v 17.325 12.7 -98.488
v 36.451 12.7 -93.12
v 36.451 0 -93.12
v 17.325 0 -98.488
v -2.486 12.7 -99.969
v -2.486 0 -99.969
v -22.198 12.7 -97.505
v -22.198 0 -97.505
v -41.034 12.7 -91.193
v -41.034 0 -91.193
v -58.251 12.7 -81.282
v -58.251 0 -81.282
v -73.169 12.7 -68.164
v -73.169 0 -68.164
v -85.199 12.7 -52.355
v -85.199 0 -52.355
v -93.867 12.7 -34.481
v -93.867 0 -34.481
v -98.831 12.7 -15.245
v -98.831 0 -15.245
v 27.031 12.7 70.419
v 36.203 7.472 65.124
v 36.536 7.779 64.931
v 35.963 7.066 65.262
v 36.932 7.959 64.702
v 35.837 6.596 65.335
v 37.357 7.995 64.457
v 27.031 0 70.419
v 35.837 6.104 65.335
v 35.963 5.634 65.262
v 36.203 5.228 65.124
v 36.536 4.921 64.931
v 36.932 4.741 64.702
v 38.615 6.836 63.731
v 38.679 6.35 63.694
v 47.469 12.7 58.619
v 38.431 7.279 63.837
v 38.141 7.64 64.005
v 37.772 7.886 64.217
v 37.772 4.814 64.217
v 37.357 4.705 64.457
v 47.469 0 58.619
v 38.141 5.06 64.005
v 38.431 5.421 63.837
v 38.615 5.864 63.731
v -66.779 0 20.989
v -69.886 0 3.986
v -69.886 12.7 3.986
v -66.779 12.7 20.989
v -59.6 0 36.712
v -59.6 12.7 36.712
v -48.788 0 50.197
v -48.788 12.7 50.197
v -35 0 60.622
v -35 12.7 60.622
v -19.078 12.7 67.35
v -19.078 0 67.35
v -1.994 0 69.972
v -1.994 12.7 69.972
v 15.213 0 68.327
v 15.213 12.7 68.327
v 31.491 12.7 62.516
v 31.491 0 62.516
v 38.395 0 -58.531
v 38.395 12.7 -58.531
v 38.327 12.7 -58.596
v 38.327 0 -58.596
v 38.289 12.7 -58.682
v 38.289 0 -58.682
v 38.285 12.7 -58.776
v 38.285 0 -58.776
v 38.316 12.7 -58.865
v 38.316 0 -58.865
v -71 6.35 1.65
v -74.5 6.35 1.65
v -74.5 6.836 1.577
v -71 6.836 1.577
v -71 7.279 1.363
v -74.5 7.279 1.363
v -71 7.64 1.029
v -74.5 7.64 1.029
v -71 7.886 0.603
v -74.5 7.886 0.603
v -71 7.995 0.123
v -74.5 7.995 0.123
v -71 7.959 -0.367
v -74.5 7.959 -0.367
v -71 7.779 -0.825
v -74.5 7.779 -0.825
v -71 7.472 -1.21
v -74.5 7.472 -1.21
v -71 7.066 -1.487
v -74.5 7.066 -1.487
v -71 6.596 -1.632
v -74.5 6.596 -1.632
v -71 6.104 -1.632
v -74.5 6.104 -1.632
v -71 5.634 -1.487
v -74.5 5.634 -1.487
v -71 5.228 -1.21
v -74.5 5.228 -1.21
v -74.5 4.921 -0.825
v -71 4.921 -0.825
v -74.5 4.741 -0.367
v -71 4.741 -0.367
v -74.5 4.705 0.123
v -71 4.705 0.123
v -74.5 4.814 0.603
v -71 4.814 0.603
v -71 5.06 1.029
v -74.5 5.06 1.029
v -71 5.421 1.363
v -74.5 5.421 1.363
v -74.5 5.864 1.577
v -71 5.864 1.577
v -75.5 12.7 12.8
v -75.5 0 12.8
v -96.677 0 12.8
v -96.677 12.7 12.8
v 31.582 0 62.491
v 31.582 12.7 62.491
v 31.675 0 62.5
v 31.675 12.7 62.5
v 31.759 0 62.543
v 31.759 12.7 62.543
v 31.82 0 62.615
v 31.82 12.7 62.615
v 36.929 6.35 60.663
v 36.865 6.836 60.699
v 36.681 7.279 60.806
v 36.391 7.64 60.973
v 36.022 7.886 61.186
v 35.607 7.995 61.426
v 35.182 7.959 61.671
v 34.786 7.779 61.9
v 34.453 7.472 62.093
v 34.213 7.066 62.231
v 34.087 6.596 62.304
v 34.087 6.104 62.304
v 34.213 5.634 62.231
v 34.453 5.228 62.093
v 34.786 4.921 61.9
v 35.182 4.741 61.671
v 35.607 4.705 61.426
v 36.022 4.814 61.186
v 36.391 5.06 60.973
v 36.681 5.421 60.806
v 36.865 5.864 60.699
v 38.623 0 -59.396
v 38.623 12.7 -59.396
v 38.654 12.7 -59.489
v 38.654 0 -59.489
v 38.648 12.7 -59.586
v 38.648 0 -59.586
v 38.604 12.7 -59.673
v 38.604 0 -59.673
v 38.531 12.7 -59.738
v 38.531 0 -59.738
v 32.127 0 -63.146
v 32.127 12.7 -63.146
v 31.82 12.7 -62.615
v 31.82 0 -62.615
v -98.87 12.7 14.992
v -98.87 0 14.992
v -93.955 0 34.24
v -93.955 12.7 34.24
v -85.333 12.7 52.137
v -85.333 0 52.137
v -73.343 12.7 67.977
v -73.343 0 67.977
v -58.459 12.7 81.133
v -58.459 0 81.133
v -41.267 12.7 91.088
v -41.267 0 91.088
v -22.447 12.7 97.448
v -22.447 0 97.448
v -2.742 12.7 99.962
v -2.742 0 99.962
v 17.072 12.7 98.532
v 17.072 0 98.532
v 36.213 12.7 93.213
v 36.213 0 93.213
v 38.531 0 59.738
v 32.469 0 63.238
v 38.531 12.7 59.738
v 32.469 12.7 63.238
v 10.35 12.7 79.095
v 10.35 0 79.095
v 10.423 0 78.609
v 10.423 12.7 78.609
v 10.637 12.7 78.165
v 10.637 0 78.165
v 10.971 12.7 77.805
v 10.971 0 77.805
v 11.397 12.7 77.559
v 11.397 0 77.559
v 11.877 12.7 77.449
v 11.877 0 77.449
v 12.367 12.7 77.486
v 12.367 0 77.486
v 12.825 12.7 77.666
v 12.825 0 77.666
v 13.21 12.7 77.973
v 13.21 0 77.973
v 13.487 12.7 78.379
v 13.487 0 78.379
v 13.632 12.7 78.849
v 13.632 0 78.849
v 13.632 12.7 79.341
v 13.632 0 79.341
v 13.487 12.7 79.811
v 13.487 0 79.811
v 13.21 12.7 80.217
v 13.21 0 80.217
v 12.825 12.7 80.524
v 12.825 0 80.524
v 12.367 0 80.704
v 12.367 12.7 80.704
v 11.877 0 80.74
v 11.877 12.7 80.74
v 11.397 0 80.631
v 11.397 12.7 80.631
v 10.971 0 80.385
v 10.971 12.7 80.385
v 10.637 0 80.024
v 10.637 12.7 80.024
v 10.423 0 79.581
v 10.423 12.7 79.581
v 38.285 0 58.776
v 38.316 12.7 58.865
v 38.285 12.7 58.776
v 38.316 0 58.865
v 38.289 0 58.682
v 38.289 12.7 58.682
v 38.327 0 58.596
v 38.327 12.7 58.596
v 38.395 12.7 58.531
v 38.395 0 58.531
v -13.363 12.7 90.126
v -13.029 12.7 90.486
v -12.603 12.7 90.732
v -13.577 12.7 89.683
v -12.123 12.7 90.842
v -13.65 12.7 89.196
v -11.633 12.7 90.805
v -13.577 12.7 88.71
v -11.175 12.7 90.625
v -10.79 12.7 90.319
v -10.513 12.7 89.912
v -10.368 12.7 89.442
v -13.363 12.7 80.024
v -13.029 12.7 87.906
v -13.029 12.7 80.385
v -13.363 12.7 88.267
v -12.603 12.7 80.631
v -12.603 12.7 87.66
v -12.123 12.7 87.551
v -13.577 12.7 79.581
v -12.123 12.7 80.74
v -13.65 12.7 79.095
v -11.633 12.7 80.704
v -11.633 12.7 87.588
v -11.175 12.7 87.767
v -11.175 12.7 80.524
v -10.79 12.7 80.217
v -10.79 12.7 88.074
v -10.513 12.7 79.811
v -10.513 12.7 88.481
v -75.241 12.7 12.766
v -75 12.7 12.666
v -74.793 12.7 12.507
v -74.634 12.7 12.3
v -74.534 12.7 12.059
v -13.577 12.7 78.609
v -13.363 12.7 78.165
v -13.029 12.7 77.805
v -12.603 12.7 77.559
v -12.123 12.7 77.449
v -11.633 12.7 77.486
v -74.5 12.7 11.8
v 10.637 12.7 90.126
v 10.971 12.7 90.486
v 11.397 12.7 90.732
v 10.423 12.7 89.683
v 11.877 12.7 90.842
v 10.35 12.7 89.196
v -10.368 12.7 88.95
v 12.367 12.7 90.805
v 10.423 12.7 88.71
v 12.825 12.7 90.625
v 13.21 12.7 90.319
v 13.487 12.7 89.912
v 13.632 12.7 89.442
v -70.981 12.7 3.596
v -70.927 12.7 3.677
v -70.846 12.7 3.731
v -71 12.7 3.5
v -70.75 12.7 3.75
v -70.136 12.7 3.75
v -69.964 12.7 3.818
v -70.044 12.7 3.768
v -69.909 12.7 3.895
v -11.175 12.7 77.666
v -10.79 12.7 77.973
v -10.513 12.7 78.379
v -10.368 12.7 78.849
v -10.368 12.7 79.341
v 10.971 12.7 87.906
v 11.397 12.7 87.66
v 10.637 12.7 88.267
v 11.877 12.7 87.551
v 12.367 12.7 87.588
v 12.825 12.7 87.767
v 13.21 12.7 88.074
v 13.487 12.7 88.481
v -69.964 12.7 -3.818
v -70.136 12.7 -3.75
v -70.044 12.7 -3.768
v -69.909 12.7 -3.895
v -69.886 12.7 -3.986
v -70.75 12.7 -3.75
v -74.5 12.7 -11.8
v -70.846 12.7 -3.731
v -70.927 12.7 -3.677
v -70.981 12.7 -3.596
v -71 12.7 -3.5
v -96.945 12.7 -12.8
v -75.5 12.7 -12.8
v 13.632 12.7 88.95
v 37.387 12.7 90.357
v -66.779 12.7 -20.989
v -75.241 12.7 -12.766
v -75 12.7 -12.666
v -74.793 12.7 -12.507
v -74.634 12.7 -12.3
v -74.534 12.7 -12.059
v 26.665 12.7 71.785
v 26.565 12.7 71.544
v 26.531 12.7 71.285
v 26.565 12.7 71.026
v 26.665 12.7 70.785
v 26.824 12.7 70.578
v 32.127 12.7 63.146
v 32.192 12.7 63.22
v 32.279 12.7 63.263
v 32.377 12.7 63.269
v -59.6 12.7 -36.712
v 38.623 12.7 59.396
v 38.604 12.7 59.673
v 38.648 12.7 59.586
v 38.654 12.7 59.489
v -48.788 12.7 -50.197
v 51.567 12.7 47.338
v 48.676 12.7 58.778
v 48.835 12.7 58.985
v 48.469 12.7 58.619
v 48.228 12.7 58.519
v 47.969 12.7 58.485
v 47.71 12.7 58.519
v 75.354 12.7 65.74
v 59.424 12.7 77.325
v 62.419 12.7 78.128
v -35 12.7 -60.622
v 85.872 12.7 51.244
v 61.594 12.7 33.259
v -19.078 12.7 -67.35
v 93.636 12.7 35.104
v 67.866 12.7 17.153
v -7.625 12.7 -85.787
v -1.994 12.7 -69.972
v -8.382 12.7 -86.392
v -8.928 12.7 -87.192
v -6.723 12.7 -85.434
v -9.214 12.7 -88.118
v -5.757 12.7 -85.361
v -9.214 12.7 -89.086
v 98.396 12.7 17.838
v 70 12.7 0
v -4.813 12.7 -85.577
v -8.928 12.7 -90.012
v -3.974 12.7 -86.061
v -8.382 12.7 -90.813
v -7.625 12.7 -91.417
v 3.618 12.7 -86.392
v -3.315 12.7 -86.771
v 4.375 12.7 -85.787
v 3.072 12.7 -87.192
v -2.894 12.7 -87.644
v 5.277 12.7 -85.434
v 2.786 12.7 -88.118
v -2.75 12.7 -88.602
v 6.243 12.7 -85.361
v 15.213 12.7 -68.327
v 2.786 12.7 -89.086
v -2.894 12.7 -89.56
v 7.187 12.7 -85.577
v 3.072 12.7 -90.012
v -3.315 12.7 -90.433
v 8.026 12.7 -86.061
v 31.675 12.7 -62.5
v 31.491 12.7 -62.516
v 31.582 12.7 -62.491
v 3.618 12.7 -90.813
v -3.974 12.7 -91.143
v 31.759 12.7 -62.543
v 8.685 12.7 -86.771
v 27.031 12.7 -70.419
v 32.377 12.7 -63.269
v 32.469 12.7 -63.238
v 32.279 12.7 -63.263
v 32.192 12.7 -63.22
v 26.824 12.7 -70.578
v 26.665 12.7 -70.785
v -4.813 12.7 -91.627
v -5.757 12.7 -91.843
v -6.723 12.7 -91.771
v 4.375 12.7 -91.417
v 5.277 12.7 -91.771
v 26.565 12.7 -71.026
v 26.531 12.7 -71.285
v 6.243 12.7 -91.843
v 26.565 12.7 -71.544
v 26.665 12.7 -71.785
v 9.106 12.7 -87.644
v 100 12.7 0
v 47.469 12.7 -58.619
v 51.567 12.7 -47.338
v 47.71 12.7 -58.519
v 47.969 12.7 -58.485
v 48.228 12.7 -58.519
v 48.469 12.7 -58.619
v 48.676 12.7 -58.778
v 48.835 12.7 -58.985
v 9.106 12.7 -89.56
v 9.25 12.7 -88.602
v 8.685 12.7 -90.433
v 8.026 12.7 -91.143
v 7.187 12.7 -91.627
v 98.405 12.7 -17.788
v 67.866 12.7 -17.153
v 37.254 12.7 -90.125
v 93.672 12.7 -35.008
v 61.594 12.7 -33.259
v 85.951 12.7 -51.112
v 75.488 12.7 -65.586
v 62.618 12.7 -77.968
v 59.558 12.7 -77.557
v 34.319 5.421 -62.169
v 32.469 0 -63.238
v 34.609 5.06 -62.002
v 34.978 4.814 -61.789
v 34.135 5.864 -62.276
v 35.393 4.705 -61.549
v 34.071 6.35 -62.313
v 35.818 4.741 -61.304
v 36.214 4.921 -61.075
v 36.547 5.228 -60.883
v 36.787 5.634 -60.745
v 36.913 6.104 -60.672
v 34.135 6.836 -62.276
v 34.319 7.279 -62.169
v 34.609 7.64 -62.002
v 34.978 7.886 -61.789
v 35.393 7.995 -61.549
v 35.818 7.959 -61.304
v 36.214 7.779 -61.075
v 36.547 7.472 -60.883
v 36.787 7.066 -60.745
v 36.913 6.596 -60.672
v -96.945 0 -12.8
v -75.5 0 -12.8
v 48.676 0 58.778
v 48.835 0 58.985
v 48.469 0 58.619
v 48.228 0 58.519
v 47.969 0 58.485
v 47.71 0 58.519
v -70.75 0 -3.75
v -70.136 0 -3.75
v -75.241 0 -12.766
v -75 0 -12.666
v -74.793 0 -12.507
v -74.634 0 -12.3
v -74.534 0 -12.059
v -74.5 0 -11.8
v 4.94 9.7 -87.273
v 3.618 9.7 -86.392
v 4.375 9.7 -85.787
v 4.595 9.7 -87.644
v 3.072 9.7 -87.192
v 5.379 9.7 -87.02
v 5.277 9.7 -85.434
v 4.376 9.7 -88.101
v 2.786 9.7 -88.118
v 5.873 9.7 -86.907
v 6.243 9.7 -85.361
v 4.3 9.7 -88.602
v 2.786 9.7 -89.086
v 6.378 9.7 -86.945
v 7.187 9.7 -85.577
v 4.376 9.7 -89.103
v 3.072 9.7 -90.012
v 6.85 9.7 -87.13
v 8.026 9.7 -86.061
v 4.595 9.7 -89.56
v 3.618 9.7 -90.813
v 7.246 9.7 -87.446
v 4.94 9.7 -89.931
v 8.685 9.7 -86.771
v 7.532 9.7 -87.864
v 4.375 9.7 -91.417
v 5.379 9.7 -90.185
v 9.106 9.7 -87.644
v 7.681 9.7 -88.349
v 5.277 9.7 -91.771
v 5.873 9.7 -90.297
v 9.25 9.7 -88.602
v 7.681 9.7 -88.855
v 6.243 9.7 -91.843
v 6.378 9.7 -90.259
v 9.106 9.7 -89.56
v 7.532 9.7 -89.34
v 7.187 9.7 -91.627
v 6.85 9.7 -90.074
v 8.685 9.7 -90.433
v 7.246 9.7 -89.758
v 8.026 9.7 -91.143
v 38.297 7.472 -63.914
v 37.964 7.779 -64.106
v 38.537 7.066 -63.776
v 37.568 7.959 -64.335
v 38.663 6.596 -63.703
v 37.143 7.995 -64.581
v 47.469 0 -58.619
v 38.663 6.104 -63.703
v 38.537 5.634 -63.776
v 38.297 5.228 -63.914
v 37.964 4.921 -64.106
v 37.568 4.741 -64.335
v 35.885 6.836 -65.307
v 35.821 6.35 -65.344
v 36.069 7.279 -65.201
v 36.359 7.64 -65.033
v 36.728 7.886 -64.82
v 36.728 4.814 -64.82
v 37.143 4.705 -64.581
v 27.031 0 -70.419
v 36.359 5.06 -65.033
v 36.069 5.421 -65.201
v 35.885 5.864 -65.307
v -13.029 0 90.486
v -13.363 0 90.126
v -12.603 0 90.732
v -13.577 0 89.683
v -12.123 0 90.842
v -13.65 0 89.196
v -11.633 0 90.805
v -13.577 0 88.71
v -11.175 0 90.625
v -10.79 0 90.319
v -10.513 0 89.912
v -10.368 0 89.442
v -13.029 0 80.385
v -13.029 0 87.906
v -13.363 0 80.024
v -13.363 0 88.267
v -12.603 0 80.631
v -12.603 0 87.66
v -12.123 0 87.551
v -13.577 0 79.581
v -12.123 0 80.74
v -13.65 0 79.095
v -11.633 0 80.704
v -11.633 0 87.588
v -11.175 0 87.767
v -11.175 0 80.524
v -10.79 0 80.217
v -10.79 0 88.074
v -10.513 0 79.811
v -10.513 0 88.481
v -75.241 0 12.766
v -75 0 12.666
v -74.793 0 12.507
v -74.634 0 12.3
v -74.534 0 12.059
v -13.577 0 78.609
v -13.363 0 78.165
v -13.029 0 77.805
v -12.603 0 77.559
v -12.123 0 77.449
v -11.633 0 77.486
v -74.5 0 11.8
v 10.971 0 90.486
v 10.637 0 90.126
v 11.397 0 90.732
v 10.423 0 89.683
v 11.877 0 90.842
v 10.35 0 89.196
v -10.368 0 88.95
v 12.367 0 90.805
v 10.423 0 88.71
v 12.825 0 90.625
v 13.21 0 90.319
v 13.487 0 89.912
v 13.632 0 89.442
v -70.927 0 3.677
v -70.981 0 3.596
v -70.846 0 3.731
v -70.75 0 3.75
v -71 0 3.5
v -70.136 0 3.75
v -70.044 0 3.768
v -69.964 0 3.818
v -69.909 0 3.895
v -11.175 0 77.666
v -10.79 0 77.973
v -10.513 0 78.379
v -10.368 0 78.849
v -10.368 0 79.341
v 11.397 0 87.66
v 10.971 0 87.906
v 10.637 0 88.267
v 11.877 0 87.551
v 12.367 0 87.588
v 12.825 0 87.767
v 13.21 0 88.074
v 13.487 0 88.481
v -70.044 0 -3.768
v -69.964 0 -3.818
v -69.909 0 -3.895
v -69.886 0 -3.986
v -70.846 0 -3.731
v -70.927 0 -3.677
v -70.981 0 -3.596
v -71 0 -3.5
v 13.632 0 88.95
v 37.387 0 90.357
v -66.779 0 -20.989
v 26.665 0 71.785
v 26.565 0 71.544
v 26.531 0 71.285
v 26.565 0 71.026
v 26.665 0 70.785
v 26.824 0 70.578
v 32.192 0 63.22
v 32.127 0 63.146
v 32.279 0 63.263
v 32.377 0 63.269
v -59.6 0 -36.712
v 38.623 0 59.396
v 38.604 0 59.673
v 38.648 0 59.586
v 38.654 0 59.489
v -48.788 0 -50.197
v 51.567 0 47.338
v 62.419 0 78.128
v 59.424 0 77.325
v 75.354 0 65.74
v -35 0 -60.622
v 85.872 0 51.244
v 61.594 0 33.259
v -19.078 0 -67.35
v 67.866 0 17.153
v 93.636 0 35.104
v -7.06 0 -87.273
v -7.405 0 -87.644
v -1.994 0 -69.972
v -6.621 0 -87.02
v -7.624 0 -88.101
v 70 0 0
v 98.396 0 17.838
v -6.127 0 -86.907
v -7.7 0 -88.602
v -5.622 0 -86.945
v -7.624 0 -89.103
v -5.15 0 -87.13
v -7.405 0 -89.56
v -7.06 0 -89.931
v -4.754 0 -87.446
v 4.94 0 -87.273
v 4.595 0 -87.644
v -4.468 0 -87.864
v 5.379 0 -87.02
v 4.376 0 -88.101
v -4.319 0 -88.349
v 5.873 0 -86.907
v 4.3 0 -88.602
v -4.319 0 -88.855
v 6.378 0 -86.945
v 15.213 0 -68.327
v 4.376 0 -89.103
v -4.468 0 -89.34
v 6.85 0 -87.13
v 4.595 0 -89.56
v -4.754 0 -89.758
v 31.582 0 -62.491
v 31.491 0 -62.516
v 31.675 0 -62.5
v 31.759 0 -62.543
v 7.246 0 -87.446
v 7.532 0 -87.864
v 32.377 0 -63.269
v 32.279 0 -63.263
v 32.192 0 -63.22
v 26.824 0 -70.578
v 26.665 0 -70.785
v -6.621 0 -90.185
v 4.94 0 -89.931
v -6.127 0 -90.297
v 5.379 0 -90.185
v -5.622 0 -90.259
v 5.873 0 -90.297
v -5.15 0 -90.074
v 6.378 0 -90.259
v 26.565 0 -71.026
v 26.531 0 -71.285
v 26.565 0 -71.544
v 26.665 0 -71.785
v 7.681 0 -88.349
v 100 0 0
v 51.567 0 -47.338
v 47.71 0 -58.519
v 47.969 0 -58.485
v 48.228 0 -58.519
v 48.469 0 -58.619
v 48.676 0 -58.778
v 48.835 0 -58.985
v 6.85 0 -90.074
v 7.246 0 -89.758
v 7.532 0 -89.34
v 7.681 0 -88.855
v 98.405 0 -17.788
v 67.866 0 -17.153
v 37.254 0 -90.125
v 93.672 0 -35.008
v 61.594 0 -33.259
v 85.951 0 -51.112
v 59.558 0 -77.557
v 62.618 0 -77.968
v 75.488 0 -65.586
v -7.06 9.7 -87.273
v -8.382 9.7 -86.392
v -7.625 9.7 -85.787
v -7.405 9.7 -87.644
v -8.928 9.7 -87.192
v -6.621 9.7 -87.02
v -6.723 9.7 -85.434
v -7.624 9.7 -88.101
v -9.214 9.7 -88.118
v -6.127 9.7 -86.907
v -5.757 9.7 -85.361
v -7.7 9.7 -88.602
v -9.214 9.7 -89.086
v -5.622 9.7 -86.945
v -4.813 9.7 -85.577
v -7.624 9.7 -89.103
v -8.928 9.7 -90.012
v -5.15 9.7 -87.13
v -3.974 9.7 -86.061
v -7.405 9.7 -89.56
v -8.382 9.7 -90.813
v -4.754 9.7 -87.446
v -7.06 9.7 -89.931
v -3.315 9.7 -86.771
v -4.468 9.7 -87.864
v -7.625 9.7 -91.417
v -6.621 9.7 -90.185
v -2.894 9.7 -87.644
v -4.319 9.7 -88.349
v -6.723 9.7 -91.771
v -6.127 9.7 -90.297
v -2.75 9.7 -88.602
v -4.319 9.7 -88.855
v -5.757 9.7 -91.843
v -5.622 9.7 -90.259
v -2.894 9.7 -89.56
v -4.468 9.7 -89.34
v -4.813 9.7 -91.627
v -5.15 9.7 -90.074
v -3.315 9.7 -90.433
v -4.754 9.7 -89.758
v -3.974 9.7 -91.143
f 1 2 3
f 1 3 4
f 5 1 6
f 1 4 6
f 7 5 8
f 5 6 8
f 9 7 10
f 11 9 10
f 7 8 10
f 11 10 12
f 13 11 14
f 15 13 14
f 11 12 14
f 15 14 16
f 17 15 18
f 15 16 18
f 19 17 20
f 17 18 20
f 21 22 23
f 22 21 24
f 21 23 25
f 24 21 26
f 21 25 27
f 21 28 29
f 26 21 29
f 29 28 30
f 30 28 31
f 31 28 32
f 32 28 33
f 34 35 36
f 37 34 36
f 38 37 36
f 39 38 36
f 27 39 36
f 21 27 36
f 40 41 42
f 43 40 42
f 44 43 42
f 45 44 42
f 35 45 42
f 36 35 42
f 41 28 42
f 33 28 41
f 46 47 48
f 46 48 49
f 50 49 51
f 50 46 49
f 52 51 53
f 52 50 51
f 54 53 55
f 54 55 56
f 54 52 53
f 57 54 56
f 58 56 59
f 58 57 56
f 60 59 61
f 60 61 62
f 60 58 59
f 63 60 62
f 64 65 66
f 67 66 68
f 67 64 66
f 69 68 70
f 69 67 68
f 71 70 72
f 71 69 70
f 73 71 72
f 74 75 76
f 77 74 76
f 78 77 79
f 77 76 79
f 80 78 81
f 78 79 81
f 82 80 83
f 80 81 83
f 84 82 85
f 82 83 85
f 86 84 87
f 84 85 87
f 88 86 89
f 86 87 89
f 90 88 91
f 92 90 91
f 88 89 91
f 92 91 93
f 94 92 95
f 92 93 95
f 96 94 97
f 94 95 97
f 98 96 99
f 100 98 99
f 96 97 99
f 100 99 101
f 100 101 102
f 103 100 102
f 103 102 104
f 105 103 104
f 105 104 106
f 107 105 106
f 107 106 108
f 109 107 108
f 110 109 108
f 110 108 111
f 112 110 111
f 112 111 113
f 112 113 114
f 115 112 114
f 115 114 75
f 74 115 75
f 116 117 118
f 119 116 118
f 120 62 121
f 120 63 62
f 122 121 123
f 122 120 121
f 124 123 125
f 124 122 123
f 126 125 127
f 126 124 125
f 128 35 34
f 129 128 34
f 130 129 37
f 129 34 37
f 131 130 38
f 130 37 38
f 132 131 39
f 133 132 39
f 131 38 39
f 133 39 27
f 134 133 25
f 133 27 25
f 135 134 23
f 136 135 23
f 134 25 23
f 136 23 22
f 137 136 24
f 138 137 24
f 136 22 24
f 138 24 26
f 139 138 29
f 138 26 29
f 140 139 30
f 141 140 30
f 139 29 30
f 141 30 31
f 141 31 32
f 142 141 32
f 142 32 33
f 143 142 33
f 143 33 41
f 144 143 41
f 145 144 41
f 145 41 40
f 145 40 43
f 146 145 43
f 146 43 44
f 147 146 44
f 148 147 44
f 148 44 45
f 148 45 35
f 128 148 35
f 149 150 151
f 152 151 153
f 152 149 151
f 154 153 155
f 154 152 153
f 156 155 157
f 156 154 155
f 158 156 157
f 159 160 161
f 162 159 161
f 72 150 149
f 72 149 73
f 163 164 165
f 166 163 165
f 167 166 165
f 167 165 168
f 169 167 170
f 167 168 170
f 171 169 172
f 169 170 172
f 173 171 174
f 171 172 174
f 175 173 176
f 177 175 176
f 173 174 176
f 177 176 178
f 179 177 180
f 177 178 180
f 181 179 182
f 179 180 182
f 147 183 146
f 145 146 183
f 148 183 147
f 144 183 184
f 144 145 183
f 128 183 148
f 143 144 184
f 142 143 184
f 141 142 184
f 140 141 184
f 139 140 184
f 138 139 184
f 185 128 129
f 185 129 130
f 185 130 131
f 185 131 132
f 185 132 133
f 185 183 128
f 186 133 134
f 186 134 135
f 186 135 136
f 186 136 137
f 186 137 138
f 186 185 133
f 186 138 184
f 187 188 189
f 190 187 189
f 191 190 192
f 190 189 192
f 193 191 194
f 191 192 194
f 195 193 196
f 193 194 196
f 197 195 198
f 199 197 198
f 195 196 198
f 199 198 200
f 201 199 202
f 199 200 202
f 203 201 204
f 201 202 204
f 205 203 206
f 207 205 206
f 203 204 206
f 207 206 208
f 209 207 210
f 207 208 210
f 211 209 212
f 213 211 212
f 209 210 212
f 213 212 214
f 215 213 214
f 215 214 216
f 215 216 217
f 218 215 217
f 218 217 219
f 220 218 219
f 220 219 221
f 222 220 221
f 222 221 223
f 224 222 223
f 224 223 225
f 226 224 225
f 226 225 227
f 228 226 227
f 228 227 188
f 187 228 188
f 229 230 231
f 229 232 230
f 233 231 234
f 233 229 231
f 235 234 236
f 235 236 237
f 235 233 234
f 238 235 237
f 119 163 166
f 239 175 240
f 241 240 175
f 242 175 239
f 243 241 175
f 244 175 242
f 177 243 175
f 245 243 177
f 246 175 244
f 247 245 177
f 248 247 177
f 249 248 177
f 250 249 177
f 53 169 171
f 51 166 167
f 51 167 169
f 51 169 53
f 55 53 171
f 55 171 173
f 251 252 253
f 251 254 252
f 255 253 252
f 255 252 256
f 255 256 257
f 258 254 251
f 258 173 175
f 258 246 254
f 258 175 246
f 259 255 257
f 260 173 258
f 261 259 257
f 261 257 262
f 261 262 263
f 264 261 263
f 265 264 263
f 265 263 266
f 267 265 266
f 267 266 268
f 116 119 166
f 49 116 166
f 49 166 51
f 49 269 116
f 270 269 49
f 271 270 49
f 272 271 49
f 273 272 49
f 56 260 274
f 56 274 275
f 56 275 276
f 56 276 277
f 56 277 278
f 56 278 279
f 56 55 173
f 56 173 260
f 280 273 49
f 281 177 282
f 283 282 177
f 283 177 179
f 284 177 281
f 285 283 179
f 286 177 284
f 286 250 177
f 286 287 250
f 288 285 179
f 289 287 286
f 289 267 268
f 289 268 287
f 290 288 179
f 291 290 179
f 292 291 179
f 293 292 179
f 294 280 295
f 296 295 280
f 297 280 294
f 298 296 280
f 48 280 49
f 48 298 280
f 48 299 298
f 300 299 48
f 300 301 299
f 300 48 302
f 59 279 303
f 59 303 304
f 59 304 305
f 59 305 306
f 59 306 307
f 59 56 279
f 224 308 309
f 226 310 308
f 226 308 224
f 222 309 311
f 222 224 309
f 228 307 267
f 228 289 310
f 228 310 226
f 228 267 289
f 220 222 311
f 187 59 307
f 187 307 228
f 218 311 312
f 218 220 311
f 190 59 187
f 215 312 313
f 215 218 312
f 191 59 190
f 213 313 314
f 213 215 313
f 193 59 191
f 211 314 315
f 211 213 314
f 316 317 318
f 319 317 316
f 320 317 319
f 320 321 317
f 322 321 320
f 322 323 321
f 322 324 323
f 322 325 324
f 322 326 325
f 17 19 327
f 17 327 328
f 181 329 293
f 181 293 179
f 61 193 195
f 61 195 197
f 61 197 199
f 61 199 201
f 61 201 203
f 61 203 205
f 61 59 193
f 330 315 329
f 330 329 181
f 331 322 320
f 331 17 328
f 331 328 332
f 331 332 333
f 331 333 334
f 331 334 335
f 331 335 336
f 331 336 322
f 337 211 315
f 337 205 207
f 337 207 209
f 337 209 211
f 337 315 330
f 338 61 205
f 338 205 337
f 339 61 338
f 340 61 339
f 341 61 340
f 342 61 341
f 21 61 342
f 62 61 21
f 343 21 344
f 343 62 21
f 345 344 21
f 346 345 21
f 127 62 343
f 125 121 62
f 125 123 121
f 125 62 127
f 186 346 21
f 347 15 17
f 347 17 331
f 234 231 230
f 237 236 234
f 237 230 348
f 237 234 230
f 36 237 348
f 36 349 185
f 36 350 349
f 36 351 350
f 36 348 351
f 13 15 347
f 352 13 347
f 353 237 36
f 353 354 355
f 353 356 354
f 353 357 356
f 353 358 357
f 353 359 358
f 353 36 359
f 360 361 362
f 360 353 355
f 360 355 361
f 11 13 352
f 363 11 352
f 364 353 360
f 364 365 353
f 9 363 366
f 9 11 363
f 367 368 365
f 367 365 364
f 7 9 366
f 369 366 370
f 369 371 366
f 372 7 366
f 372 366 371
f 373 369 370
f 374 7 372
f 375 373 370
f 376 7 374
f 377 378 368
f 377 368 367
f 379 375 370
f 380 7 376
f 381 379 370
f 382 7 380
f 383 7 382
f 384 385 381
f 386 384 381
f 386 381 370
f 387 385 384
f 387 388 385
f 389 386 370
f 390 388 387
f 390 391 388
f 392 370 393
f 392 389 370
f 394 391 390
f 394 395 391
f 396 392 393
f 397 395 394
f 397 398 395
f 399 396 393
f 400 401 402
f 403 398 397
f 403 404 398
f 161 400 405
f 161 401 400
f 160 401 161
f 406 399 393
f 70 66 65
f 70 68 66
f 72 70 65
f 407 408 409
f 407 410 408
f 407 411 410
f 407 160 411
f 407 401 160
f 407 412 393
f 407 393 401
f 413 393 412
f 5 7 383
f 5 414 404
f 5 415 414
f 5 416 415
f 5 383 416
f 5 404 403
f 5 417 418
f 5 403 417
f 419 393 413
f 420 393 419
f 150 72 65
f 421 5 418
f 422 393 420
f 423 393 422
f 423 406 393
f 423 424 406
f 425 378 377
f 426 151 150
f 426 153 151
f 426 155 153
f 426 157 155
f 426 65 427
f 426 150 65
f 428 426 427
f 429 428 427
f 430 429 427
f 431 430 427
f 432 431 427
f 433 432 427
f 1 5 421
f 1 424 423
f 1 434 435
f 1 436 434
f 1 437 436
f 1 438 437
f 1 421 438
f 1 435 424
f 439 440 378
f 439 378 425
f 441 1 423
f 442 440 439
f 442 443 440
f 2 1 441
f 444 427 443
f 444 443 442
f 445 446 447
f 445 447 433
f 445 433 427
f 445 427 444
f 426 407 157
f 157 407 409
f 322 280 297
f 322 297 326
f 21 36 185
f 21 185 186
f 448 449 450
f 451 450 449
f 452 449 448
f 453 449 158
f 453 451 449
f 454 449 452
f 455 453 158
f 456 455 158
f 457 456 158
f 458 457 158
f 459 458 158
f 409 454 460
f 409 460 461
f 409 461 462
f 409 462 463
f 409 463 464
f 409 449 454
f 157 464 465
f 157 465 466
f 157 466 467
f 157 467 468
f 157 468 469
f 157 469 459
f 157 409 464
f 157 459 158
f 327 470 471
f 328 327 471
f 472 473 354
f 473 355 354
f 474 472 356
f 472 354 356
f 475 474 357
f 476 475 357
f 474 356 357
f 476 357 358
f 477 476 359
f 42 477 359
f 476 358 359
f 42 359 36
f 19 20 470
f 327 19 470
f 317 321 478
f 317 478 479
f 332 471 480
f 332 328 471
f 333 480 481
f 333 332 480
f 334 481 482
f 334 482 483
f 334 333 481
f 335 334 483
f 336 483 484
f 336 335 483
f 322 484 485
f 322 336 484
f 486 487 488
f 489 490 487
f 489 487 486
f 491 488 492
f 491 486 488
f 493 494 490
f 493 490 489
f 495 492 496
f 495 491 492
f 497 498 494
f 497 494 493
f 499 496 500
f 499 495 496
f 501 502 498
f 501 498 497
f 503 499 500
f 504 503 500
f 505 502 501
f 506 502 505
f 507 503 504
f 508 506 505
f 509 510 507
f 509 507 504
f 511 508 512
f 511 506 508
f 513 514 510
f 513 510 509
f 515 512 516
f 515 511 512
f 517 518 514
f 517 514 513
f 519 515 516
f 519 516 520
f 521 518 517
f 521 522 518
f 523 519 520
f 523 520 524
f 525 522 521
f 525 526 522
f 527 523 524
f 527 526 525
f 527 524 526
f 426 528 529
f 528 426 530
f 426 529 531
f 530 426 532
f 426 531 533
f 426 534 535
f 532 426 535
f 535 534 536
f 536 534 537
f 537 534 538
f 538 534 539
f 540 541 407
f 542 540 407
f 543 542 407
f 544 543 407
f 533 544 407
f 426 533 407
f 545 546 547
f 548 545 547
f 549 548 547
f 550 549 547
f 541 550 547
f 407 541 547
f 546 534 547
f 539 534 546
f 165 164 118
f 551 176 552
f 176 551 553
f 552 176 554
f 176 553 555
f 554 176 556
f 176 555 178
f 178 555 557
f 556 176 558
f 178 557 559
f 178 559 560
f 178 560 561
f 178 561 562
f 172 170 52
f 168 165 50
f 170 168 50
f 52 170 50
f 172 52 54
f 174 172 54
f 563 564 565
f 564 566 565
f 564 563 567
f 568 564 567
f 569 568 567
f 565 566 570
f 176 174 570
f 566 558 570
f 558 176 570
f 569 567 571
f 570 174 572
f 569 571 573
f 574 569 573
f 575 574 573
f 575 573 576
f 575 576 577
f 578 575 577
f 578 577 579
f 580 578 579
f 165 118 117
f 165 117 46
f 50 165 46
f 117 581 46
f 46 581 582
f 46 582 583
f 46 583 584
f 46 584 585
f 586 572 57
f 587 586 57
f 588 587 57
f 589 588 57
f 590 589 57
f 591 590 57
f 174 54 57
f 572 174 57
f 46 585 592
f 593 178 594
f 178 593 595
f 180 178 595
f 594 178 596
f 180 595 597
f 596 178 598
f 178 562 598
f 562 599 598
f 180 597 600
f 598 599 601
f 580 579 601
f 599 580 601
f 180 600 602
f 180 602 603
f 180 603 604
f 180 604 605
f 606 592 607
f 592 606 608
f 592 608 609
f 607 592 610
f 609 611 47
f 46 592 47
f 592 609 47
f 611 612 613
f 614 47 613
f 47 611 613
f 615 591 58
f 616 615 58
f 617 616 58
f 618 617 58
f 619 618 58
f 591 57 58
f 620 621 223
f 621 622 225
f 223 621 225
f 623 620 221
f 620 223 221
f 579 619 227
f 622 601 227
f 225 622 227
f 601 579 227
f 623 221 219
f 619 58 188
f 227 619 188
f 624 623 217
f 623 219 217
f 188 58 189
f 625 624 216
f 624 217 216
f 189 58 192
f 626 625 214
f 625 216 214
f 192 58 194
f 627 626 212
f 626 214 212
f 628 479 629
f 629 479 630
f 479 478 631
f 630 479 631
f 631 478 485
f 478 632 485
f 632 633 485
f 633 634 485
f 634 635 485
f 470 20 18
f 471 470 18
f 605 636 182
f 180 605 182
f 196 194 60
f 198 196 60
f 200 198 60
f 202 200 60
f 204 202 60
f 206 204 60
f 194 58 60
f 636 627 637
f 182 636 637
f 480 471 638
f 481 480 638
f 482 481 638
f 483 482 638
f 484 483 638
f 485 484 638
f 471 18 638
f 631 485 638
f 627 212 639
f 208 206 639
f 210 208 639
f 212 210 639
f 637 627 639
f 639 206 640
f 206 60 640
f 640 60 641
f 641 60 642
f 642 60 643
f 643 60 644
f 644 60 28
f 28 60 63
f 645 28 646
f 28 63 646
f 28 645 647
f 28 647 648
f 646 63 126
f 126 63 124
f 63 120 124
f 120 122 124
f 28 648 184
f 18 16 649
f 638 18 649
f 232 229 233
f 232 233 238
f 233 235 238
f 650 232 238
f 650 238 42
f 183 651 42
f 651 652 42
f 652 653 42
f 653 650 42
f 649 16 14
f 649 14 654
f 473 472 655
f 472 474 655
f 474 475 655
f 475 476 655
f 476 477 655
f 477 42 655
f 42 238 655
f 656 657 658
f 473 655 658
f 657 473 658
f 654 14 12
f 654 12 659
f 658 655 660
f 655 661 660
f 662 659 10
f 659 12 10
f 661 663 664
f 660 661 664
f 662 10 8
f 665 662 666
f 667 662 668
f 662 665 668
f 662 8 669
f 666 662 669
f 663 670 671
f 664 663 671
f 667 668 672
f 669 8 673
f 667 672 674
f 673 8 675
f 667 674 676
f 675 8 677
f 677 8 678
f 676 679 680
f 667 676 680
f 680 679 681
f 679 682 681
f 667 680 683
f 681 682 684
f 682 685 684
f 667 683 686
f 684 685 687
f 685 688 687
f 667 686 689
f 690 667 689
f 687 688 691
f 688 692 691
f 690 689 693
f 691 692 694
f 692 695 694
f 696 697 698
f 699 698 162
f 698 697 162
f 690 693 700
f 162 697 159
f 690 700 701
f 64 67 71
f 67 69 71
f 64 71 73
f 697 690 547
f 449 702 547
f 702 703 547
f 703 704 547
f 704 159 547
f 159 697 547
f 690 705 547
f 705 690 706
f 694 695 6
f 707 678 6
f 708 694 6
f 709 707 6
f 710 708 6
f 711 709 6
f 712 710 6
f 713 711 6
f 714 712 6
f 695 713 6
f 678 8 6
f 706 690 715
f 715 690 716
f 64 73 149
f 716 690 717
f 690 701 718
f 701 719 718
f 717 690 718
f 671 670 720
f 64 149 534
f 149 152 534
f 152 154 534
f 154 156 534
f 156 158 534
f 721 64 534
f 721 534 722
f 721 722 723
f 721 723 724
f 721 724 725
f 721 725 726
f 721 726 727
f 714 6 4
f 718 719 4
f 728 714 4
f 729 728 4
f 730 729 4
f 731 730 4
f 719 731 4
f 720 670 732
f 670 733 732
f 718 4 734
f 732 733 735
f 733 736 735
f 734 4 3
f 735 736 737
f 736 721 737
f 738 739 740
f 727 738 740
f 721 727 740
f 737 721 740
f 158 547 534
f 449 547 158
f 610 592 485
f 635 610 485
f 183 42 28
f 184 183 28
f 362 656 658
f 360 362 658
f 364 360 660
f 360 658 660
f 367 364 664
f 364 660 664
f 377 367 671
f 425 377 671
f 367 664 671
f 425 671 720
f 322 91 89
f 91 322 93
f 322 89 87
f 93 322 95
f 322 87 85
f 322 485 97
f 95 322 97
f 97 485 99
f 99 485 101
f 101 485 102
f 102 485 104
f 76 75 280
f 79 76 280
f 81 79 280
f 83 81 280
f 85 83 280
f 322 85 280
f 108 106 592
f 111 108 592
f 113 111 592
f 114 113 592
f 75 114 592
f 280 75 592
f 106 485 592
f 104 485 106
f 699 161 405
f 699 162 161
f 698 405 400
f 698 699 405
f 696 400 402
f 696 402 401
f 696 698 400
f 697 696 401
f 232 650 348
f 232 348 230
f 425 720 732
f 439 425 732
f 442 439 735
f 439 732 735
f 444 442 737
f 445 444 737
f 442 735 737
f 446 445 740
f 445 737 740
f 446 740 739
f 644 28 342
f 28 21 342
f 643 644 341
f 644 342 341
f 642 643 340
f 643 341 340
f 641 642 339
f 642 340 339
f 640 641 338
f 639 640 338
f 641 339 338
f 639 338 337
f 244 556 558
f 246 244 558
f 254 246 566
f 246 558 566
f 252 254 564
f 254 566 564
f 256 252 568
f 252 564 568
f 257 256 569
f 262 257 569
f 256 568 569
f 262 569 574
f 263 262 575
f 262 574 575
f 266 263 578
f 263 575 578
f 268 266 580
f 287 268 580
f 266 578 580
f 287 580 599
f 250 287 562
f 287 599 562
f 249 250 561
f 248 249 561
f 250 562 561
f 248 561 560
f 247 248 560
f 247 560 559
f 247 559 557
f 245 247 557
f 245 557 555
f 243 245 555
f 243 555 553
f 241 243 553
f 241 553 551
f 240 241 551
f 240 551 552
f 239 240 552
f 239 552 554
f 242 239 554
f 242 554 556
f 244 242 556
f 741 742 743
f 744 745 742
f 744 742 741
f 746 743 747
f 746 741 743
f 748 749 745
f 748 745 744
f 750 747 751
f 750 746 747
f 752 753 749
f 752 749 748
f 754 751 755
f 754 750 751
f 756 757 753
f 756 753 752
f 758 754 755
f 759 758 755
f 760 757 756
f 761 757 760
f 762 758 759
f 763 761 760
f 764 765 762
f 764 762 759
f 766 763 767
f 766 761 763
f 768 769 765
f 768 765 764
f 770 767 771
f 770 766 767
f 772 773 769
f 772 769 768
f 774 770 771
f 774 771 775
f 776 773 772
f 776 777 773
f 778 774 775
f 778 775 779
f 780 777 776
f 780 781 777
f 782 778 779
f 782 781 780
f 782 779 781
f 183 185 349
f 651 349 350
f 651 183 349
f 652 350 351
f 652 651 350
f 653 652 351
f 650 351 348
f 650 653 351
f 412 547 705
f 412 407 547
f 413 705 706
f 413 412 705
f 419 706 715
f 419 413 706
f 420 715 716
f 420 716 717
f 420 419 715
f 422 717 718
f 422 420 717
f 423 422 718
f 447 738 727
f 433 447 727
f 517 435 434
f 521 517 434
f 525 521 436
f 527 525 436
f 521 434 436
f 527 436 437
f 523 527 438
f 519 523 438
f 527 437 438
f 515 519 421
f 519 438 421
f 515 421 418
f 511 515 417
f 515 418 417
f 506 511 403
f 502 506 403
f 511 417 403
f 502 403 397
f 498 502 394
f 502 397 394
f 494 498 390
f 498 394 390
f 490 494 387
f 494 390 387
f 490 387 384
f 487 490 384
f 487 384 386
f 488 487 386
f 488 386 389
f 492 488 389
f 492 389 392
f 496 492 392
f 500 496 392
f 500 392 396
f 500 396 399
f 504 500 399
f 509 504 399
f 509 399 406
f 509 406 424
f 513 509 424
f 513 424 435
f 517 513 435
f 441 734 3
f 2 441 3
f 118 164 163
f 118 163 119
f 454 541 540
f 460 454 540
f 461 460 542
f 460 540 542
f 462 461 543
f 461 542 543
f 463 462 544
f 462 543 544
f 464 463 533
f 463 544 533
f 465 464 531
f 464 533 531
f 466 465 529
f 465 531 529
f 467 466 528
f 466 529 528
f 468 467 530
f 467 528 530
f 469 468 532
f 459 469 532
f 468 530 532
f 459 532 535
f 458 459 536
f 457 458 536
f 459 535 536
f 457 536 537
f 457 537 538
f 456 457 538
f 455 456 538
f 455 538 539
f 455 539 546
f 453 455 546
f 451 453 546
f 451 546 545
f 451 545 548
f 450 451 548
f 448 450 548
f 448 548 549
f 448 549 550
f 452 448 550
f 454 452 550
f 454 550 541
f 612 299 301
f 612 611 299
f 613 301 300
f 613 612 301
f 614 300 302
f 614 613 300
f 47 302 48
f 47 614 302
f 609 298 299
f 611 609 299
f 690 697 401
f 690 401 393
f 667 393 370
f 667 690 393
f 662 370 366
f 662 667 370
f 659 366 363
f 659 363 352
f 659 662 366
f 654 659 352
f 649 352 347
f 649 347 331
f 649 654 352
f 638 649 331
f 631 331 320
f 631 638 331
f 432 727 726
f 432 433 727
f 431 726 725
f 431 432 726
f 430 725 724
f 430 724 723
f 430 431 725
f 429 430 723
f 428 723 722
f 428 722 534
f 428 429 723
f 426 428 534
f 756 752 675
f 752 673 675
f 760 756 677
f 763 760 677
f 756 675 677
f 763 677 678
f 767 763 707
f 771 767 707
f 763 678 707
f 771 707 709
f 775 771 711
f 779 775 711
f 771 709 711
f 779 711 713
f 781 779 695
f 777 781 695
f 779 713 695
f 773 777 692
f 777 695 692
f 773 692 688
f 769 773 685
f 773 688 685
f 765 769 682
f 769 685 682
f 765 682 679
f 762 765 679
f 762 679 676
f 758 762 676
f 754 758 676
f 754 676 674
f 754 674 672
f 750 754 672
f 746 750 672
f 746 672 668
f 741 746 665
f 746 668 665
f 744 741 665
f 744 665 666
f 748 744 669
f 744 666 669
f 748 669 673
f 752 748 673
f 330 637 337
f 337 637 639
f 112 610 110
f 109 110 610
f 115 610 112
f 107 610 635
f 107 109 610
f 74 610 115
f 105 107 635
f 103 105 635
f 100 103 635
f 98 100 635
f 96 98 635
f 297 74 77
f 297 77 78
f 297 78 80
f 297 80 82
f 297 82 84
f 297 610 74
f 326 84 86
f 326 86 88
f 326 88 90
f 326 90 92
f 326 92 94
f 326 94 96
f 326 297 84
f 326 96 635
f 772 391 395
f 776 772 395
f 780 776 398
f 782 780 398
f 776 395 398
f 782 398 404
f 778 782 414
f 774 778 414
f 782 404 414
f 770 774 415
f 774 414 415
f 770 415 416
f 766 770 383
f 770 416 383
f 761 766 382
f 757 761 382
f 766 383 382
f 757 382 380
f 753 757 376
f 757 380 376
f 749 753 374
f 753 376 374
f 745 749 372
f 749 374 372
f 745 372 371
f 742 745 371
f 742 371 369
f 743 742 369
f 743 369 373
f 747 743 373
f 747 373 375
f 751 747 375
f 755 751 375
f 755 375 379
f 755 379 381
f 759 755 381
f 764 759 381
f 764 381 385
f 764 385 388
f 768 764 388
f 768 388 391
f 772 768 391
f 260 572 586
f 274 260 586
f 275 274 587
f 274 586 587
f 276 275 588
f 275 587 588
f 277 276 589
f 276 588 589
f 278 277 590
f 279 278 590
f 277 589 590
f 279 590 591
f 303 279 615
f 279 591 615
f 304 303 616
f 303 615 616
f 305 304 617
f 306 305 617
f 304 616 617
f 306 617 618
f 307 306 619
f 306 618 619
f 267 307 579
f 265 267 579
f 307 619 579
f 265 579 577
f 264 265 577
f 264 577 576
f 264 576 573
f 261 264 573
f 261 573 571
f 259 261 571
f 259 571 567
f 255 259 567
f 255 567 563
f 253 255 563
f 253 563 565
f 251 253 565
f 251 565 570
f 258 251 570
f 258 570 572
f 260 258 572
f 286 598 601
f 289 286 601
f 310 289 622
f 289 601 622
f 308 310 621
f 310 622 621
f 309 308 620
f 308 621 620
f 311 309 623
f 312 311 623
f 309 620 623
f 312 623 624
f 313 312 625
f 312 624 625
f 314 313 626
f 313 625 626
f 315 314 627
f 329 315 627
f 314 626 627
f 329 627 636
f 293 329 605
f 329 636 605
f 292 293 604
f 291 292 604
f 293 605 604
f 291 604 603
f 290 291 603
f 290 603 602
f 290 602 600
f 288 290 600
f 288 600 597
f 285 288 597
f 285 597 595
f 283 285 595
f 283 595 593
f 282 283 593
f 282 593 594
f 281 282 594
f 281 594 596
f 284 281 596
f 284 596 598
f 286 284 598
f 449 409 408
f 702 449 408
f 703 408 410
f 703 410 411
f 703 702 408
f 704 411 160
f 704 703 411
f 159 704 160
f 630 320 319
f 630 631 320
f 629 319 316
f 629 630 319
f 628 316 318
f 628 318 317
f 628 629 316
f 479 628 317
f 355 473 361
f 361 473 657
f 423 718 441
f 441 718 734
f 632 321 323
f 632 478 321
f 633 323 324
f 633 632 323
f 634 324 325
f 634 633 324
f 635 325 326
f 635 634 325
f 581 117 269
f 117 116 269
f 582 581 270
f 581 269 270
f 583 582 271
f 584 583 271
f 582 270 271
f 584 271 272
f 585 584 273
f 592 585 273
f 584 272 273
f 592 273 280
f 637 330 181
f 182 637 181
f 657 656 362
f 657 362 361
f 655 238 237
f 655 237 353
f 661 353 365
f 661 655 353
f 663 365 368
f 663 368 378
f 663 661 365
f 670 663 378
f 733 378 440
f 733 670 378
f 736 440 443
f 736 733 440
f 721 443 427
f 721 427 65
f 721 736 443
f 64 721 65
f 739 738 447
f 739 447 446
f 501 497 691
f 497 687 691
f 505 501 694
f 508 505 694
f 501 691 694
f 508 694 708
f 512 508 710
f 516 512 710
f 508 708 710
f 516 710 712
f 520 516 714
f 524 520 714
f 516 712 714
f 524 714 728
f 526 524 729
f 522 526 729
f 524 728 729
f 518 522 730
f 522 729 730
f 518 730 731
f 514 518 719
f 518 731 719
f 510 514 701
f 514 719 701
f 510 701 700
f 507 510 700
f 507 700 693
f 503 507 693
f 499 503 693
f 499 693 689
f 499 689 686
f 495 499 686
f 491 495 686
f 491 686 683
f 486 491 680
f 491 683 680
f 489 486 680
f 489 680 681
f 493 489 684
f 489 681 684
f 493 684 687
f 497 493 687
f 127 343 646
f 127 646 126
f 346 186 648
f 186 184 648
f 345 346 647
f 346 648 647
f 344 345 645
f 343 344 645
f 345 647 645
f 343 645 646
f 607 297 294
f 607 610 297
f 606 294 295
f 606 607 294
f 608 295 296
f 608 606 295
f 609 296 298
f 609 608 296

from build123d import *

# Parameters (mm, degrees)
SKETCH1_R                      = 70
BOSS_EXTRUDE2_DEPTH            = 12.7
FILLET1_R                      = 1
CHAMFER1_SIZE                  = 2.232593028
CHAMFER1_SIZE_2                = 2.5
F_3_0MM_DOWEL_HOLE2_REACH      = 215.907
F_3_0MM_DOWEL_HOLE2_BORE_R     = 1.65
CIRPATTERN3_COUNT              = 3
SKETCH8_W                      = 2
SKETCH8_H                      = 7.5
CUT_EXTRUDE1_DEPTH             = 142.990457435
FILLET2_R                      = 0.25
CIRPATTERN4_COUNT              = 3
FILLET2_OF_CIRPATTERN4_R       = 0.25
CBORE_FOR_M3_SHCS1_D           = 3.4
CBORE_FOR_M3_SHCS1_DEPTH       = 25.25
CBORE_FOR_M3_SHCS1_CBORE_D     = 6.5
CBORE_FOR_M3_SHCS1_CBORE_DEPTH = 3
CBORE_FOR_M3_SHCS1_TIP         = 1.021463052
F_3_0MM_DOWEL_HOLE3_D          = 3.3
F_3_0MM_DOWEL_HOLE3_DEPTH      = 45
F_3_0MM_DOWEL_HOLE3_TIP        = 0.991420021


with BuildPart() as part:
    # Sketch1 → Boss-Extrude2 (new body)
    with BuildSketch(Plane(origin=(0, 0, 0), x_dir=(1, 0, 0), z_dir=(0, 1, 0))):
        with BuildLine():
            ThreePointArc((100, 0), (89.630863423, 44.343075243), (60.673833561, 79.490162417))
            Line((60.673833561, 79.490162417), (48.335125168, 58.118892582))
            Line((48.335125168, 58.118892582), (26.164874832, 70.918892582))
            Line((26.164874832, 70.918892582), (38.503583224, 92.290162417))
            ThreePointArc((38.503583224, 92.290162417), (-50, 86.602540378), (-99.177416784, 12.8))
            Line((-99.177416784, 12.8), (-74.5, 12.8))
            Line((-74.5, 12.8), (-74.5, -12.8))
            Line((-74.5, -12.8), (-99.177416784, -12.8))
            ThreePointArc((-99.177416784, -12.8), (-50, -86.602540378), (38.503583224, -92.290162417))
            Line((38.503583224, -92.290162417), (26.164874832, -70.918892582))
            Line((26.164874832, -70.918892582), (48.335125168, -58.118892582))
            Line((48.335125168, -58.118892582), (60.673833561, -79.490162417))
            ThreePointArc((60.673833561, -79.490162417), (89.630863423, -44.343075243), (100, 0))
        make_face()
        with Locations(Location((0, 0, 0), (0, 0, 270))):
            Circle(SKETCH1_R, mode=Mode.SUBTRACT)
    extrude(amount=BOSS_EXTRUDE2_DEPTH)

    # Fillet1
    fillet1_edges = [part.edges().sort_by_distance(p)[0] for p in [
        (48.335125168, 6.35, 58.118892582),
        (26.164874832, 6.35, 70.918892582),
        (-74.5, 6.35, 12.8),
        (-74.5, 6.35, -12.8),
        (26.164874832, 6.35, -70.918892582),
        (48.335125168, 6.35, -58.118892582),
    ]]
    fillet(fillet1_edges, radius=FILLET1_R)

    # Chamfer1
    # the kernel refuses this chamfer: 2.5, 2.232593028 mm, written as the material it takes off along each edge
    with BuildSketch(Plane(origin=(38.503583224, -6.351330223, 92.290162417), x_dir=(-0.4999999999994457, 0, -0.8660254037847587), z_dir=(0, 1, 0)), Plane(origin=(60.673833561, -6.351330223, -79.490162417), x_dir=(-0.5000000000003051, 0, 0.8660254037842624), z_dir=(0, 1, 0))) as chamfer1_piece_1:
        with BuildLine():
            Line((CHAMFER1_SIZE, 0), (0.346342416, 2.445285803))
            ThreePointArc((0.346342416, 2.445285803), (0.170523224, 1.258272567), (0, 0))
            Line((0, 0), (CHAMFER1_SIZE, 0))
        make_face()
    extrude(amount=25.402660447, mode=Mode.SUBTRACT)
    with BuildSketch(Plane(origin=(-99.177416784, -6.42920747, 12.8), x_dir=(0.13897023449143497, 0, 0.990296558574953), z_dir=(0, 1, 0)), Plane(origin=(60.673833561, -6.42920747, 79.490162417), x_dir=(0.7881368597604604, 0, -0.6155000327269856), z_dir=(0, 1, 0))) as chamfer1_piece_2:
        with BuildLine():
            Line((2.213825834, 0), (CHAMFER1_SIZE_2 * 0.138970234491, CHAMFER1_SIZE_2 * 0.990296558575))
            Line((CHAMFER1_SIZE_2 * 0.138970234491, CHAMFER1_SIZE_2 * 0.990296558575), (0, 0))
            ThreePointArc((0, 0), (1.137001677, -0.006121942), (2.213825834, 0))
        make_face()
    extrude(amount=25.55841494, mode=Mode.SUBTRACT)
    with BuildSketch(Plane(origin=(-99.177416784, -6.351330223, -12.8), x_dir=(0.1402371214073107, 0, -0.9901179474079799), z_dir=(0, 1, 0))) as chamfer1_piece_3:
        with BuildLine():
            Line((2.469691423, 0), (CHAMFER1_SIZE * 0.140237121404, -CHAMFER1_SIZE * 0.990117947384))
            Line((CHAMFER1_SIZE * 0.140237121404, -CHAMFER1_SIZE * 0.990117947384), (0, 0))
            ThreePointArc((0, 0), (1.269751938, 0.007618418), (2.469691423, 0))
        make_face()
    extrude(amount=25.402660447, mode=Mode.SUBTRACT)
    with BuildSketch(Plane(origin=(38.503583224, -6.42920747, -92.290162417), x_dir=(-0.49999999999948913, 0, 0.8660254037847336), z_dir=(0, 1, 0))) as chamfer1_piece_4:
        with BuildLine():
            Line((CHAMFER1_SIZE_2, 0), (0.307655895, -2.192344105))
            ThreePointArc((0.307655895, -2.192344105), (0.151946852, -1.126819615), (0, 0))
            Line((0, 0), (CHAMFER1_SIZE_2, 0))
        make_face()
    extrude(amount=25.55841494, mode=Mode.SUBTRACT)

    # Ø3.0mm Dowel Hole2 bore → Ø3.0mm Dowel Hole2 (cut, up to next)
    with BuildSketch(Plane(origin=(37.25, 0, 64.518892582), x_dir=(0.8660254037844382, 0, -0.500000000000001), z_dir=(0.5000000000000009, 0, 0.866025403784438)), mode=Mode.PRIVATE) as f_3_0mm_dowel_hole2_sk1:
        with Locations((0, 6.35)):
            Circle(F_3_0MM_DOWEL_HOLE2_BORE_R)
    f_3_0mm_dowel_hole2_tool1 = extrude(f_3_0mm_dowel_hole2_sk1.sketch, amount=-F_3_0MM_DOWEL_HOLE2_REACH, mode=Mode.PRIVATE) & part.part
    f_3_0mm_dowel_hole2 = f_3_0mm_dowel_hole2_tool1.solids().sort_by_distance((37.25, 6.35, 64.518893))[0]
    add(f_3_0mm_dowel_hole2, mode=Mode.SUBTRACT)

    # CirPattern3: Ø3.0mm Dowel Hole2 ×3 about axis
    cirpattern3_axis = Axis((0, 12.7, 0), (0, -1, 0))
    for i in range(1, CIRPATTERN3_COUNT):
        add(f_3_0mm_dowel_hole2.rotate(cirpattern3_axis, i * 360 / CIRPATTERN3_COUNT), mode=Mode.SUBTRACT)

    # Sketch8 → Cut-Extrude1 (cut, through all)
    with BuildSketch(Plane(origin=(0, 12.7, 0), x_dir=(1, 0, 0), z_dir=(0, 1, 0))):
        with Locations((-70, 0)):
            Rectangle(SKETCH8_W, SKETCH8_H)
    cut_extrude1 = extrude(amount=-CUT_EXTRUDE1_DEPTH, mode=Mode.SUBTRACT)

    # Fillet2
    fillet2_edges = [part.edges().sort_by_distance(p)[0] for p in [
        (-69.8994814, 6.35, 3.75),
        (-69.8994814, 6.35, -3.75),
        (-71, 6.35, 3.75),
        (-71, 6.35, -3.75),
    ]]
    fillet(fillet2_edges, radius=FILLET2_R)

    # CirPattern4: Cut-Extrude1 ×3 about axis
    cirpattern4_axis = Axis((0, 0, 0), (0, 1, 0))
    for i in range(1, CIRPATTERN4_COUNT):
        add(cut_extrude1.rotate(cirpattern4_axis, i * 360 / CIRPATTERN4_COUNT), mode=Mode.SUBTRACT)

    # Fillet2 of CirPattern4
    fillet2_of_cirpattern4_edges = [part.edges().sort_by_distance(p)[0] for p in [
        (38.197335964, 6.35, 58.659726604),
        (31.702145436, 6.35, 62.409726604),
        (38.747595264, 6.35, 59.612803669),
        (32.252404736, 6.35, 63.362803669),
        (31.702145436, 6.35, -62.409726604),
        (38.197335964, 6.35, -58.659726604),
        (32.252404736, 6.35, -63.362803669),
        (38.747595264, 6.35, -59.612803669),
    ]]
    fillet(fillet2_of_cirpattern4_edges, radius=FILLET2_OF_CIRPATTERN4_R)

    # CBORE for M3 SHCS1
    with Locations(Plane(origin=(0, 12.7, 0), x_dir=(1, 0, 0), z_dir=(0, 1, 0))):
        with Locations((6, 88.602076866), (-6, 88.602076866)):
            CounterBoreHole(CBORE_FOR_M3_SHCS1_D / 2, CBORE_FOR_M3_SHCS1_CBORE_D / 2, CBORE_FOR_M3_SHCS1_CBORE_DEPTH, depth=CBORE_FOR_M3_SHCS1_DEPTH)
            with Locations((0, 0, -(CBORE_FOR_M3_SHCS1_DEPTH + CBORE_FOR_M3_SHCS1_TIP / 2))):  # 118° drill point
                Cone(0, CBORE_FOR_M3_SHCS1_D / 2, CBORE_FOR_M3_SHCS1_TIP, mode=Mode.SUBTRACT)

    # Ø3.0mm Dowel Hole3
    with Locations(Plane(origin=(0, 12.7, 0), x_dir=(1, 0, 0), z_dir=(0, 1, 0))):
        with Locations((12, -79.094879733), (12, -89.196412484), (-12, -89.196412484), (-12, -79.094879733)):
            Hole(F_3_0MM_DOWEL_HOLE3_D / 2, depth=F_3_0MM_DOWEL_HOLE3_DEPTH)
            with Locations((0, 0, -(F_3_0MM_DOWEL_HOLE3_DEPTH + F_3_0MM_DOWEL_HOLE3_TIP / 2))):  # 118° drill point
                Cone(0, F_3_0MM_DOWEL_HOLE3_D / 2, F_3_0MM_DOWEL_HOLE3_TIP, mode=Mode.SUBTRACT)


solid = part.part
